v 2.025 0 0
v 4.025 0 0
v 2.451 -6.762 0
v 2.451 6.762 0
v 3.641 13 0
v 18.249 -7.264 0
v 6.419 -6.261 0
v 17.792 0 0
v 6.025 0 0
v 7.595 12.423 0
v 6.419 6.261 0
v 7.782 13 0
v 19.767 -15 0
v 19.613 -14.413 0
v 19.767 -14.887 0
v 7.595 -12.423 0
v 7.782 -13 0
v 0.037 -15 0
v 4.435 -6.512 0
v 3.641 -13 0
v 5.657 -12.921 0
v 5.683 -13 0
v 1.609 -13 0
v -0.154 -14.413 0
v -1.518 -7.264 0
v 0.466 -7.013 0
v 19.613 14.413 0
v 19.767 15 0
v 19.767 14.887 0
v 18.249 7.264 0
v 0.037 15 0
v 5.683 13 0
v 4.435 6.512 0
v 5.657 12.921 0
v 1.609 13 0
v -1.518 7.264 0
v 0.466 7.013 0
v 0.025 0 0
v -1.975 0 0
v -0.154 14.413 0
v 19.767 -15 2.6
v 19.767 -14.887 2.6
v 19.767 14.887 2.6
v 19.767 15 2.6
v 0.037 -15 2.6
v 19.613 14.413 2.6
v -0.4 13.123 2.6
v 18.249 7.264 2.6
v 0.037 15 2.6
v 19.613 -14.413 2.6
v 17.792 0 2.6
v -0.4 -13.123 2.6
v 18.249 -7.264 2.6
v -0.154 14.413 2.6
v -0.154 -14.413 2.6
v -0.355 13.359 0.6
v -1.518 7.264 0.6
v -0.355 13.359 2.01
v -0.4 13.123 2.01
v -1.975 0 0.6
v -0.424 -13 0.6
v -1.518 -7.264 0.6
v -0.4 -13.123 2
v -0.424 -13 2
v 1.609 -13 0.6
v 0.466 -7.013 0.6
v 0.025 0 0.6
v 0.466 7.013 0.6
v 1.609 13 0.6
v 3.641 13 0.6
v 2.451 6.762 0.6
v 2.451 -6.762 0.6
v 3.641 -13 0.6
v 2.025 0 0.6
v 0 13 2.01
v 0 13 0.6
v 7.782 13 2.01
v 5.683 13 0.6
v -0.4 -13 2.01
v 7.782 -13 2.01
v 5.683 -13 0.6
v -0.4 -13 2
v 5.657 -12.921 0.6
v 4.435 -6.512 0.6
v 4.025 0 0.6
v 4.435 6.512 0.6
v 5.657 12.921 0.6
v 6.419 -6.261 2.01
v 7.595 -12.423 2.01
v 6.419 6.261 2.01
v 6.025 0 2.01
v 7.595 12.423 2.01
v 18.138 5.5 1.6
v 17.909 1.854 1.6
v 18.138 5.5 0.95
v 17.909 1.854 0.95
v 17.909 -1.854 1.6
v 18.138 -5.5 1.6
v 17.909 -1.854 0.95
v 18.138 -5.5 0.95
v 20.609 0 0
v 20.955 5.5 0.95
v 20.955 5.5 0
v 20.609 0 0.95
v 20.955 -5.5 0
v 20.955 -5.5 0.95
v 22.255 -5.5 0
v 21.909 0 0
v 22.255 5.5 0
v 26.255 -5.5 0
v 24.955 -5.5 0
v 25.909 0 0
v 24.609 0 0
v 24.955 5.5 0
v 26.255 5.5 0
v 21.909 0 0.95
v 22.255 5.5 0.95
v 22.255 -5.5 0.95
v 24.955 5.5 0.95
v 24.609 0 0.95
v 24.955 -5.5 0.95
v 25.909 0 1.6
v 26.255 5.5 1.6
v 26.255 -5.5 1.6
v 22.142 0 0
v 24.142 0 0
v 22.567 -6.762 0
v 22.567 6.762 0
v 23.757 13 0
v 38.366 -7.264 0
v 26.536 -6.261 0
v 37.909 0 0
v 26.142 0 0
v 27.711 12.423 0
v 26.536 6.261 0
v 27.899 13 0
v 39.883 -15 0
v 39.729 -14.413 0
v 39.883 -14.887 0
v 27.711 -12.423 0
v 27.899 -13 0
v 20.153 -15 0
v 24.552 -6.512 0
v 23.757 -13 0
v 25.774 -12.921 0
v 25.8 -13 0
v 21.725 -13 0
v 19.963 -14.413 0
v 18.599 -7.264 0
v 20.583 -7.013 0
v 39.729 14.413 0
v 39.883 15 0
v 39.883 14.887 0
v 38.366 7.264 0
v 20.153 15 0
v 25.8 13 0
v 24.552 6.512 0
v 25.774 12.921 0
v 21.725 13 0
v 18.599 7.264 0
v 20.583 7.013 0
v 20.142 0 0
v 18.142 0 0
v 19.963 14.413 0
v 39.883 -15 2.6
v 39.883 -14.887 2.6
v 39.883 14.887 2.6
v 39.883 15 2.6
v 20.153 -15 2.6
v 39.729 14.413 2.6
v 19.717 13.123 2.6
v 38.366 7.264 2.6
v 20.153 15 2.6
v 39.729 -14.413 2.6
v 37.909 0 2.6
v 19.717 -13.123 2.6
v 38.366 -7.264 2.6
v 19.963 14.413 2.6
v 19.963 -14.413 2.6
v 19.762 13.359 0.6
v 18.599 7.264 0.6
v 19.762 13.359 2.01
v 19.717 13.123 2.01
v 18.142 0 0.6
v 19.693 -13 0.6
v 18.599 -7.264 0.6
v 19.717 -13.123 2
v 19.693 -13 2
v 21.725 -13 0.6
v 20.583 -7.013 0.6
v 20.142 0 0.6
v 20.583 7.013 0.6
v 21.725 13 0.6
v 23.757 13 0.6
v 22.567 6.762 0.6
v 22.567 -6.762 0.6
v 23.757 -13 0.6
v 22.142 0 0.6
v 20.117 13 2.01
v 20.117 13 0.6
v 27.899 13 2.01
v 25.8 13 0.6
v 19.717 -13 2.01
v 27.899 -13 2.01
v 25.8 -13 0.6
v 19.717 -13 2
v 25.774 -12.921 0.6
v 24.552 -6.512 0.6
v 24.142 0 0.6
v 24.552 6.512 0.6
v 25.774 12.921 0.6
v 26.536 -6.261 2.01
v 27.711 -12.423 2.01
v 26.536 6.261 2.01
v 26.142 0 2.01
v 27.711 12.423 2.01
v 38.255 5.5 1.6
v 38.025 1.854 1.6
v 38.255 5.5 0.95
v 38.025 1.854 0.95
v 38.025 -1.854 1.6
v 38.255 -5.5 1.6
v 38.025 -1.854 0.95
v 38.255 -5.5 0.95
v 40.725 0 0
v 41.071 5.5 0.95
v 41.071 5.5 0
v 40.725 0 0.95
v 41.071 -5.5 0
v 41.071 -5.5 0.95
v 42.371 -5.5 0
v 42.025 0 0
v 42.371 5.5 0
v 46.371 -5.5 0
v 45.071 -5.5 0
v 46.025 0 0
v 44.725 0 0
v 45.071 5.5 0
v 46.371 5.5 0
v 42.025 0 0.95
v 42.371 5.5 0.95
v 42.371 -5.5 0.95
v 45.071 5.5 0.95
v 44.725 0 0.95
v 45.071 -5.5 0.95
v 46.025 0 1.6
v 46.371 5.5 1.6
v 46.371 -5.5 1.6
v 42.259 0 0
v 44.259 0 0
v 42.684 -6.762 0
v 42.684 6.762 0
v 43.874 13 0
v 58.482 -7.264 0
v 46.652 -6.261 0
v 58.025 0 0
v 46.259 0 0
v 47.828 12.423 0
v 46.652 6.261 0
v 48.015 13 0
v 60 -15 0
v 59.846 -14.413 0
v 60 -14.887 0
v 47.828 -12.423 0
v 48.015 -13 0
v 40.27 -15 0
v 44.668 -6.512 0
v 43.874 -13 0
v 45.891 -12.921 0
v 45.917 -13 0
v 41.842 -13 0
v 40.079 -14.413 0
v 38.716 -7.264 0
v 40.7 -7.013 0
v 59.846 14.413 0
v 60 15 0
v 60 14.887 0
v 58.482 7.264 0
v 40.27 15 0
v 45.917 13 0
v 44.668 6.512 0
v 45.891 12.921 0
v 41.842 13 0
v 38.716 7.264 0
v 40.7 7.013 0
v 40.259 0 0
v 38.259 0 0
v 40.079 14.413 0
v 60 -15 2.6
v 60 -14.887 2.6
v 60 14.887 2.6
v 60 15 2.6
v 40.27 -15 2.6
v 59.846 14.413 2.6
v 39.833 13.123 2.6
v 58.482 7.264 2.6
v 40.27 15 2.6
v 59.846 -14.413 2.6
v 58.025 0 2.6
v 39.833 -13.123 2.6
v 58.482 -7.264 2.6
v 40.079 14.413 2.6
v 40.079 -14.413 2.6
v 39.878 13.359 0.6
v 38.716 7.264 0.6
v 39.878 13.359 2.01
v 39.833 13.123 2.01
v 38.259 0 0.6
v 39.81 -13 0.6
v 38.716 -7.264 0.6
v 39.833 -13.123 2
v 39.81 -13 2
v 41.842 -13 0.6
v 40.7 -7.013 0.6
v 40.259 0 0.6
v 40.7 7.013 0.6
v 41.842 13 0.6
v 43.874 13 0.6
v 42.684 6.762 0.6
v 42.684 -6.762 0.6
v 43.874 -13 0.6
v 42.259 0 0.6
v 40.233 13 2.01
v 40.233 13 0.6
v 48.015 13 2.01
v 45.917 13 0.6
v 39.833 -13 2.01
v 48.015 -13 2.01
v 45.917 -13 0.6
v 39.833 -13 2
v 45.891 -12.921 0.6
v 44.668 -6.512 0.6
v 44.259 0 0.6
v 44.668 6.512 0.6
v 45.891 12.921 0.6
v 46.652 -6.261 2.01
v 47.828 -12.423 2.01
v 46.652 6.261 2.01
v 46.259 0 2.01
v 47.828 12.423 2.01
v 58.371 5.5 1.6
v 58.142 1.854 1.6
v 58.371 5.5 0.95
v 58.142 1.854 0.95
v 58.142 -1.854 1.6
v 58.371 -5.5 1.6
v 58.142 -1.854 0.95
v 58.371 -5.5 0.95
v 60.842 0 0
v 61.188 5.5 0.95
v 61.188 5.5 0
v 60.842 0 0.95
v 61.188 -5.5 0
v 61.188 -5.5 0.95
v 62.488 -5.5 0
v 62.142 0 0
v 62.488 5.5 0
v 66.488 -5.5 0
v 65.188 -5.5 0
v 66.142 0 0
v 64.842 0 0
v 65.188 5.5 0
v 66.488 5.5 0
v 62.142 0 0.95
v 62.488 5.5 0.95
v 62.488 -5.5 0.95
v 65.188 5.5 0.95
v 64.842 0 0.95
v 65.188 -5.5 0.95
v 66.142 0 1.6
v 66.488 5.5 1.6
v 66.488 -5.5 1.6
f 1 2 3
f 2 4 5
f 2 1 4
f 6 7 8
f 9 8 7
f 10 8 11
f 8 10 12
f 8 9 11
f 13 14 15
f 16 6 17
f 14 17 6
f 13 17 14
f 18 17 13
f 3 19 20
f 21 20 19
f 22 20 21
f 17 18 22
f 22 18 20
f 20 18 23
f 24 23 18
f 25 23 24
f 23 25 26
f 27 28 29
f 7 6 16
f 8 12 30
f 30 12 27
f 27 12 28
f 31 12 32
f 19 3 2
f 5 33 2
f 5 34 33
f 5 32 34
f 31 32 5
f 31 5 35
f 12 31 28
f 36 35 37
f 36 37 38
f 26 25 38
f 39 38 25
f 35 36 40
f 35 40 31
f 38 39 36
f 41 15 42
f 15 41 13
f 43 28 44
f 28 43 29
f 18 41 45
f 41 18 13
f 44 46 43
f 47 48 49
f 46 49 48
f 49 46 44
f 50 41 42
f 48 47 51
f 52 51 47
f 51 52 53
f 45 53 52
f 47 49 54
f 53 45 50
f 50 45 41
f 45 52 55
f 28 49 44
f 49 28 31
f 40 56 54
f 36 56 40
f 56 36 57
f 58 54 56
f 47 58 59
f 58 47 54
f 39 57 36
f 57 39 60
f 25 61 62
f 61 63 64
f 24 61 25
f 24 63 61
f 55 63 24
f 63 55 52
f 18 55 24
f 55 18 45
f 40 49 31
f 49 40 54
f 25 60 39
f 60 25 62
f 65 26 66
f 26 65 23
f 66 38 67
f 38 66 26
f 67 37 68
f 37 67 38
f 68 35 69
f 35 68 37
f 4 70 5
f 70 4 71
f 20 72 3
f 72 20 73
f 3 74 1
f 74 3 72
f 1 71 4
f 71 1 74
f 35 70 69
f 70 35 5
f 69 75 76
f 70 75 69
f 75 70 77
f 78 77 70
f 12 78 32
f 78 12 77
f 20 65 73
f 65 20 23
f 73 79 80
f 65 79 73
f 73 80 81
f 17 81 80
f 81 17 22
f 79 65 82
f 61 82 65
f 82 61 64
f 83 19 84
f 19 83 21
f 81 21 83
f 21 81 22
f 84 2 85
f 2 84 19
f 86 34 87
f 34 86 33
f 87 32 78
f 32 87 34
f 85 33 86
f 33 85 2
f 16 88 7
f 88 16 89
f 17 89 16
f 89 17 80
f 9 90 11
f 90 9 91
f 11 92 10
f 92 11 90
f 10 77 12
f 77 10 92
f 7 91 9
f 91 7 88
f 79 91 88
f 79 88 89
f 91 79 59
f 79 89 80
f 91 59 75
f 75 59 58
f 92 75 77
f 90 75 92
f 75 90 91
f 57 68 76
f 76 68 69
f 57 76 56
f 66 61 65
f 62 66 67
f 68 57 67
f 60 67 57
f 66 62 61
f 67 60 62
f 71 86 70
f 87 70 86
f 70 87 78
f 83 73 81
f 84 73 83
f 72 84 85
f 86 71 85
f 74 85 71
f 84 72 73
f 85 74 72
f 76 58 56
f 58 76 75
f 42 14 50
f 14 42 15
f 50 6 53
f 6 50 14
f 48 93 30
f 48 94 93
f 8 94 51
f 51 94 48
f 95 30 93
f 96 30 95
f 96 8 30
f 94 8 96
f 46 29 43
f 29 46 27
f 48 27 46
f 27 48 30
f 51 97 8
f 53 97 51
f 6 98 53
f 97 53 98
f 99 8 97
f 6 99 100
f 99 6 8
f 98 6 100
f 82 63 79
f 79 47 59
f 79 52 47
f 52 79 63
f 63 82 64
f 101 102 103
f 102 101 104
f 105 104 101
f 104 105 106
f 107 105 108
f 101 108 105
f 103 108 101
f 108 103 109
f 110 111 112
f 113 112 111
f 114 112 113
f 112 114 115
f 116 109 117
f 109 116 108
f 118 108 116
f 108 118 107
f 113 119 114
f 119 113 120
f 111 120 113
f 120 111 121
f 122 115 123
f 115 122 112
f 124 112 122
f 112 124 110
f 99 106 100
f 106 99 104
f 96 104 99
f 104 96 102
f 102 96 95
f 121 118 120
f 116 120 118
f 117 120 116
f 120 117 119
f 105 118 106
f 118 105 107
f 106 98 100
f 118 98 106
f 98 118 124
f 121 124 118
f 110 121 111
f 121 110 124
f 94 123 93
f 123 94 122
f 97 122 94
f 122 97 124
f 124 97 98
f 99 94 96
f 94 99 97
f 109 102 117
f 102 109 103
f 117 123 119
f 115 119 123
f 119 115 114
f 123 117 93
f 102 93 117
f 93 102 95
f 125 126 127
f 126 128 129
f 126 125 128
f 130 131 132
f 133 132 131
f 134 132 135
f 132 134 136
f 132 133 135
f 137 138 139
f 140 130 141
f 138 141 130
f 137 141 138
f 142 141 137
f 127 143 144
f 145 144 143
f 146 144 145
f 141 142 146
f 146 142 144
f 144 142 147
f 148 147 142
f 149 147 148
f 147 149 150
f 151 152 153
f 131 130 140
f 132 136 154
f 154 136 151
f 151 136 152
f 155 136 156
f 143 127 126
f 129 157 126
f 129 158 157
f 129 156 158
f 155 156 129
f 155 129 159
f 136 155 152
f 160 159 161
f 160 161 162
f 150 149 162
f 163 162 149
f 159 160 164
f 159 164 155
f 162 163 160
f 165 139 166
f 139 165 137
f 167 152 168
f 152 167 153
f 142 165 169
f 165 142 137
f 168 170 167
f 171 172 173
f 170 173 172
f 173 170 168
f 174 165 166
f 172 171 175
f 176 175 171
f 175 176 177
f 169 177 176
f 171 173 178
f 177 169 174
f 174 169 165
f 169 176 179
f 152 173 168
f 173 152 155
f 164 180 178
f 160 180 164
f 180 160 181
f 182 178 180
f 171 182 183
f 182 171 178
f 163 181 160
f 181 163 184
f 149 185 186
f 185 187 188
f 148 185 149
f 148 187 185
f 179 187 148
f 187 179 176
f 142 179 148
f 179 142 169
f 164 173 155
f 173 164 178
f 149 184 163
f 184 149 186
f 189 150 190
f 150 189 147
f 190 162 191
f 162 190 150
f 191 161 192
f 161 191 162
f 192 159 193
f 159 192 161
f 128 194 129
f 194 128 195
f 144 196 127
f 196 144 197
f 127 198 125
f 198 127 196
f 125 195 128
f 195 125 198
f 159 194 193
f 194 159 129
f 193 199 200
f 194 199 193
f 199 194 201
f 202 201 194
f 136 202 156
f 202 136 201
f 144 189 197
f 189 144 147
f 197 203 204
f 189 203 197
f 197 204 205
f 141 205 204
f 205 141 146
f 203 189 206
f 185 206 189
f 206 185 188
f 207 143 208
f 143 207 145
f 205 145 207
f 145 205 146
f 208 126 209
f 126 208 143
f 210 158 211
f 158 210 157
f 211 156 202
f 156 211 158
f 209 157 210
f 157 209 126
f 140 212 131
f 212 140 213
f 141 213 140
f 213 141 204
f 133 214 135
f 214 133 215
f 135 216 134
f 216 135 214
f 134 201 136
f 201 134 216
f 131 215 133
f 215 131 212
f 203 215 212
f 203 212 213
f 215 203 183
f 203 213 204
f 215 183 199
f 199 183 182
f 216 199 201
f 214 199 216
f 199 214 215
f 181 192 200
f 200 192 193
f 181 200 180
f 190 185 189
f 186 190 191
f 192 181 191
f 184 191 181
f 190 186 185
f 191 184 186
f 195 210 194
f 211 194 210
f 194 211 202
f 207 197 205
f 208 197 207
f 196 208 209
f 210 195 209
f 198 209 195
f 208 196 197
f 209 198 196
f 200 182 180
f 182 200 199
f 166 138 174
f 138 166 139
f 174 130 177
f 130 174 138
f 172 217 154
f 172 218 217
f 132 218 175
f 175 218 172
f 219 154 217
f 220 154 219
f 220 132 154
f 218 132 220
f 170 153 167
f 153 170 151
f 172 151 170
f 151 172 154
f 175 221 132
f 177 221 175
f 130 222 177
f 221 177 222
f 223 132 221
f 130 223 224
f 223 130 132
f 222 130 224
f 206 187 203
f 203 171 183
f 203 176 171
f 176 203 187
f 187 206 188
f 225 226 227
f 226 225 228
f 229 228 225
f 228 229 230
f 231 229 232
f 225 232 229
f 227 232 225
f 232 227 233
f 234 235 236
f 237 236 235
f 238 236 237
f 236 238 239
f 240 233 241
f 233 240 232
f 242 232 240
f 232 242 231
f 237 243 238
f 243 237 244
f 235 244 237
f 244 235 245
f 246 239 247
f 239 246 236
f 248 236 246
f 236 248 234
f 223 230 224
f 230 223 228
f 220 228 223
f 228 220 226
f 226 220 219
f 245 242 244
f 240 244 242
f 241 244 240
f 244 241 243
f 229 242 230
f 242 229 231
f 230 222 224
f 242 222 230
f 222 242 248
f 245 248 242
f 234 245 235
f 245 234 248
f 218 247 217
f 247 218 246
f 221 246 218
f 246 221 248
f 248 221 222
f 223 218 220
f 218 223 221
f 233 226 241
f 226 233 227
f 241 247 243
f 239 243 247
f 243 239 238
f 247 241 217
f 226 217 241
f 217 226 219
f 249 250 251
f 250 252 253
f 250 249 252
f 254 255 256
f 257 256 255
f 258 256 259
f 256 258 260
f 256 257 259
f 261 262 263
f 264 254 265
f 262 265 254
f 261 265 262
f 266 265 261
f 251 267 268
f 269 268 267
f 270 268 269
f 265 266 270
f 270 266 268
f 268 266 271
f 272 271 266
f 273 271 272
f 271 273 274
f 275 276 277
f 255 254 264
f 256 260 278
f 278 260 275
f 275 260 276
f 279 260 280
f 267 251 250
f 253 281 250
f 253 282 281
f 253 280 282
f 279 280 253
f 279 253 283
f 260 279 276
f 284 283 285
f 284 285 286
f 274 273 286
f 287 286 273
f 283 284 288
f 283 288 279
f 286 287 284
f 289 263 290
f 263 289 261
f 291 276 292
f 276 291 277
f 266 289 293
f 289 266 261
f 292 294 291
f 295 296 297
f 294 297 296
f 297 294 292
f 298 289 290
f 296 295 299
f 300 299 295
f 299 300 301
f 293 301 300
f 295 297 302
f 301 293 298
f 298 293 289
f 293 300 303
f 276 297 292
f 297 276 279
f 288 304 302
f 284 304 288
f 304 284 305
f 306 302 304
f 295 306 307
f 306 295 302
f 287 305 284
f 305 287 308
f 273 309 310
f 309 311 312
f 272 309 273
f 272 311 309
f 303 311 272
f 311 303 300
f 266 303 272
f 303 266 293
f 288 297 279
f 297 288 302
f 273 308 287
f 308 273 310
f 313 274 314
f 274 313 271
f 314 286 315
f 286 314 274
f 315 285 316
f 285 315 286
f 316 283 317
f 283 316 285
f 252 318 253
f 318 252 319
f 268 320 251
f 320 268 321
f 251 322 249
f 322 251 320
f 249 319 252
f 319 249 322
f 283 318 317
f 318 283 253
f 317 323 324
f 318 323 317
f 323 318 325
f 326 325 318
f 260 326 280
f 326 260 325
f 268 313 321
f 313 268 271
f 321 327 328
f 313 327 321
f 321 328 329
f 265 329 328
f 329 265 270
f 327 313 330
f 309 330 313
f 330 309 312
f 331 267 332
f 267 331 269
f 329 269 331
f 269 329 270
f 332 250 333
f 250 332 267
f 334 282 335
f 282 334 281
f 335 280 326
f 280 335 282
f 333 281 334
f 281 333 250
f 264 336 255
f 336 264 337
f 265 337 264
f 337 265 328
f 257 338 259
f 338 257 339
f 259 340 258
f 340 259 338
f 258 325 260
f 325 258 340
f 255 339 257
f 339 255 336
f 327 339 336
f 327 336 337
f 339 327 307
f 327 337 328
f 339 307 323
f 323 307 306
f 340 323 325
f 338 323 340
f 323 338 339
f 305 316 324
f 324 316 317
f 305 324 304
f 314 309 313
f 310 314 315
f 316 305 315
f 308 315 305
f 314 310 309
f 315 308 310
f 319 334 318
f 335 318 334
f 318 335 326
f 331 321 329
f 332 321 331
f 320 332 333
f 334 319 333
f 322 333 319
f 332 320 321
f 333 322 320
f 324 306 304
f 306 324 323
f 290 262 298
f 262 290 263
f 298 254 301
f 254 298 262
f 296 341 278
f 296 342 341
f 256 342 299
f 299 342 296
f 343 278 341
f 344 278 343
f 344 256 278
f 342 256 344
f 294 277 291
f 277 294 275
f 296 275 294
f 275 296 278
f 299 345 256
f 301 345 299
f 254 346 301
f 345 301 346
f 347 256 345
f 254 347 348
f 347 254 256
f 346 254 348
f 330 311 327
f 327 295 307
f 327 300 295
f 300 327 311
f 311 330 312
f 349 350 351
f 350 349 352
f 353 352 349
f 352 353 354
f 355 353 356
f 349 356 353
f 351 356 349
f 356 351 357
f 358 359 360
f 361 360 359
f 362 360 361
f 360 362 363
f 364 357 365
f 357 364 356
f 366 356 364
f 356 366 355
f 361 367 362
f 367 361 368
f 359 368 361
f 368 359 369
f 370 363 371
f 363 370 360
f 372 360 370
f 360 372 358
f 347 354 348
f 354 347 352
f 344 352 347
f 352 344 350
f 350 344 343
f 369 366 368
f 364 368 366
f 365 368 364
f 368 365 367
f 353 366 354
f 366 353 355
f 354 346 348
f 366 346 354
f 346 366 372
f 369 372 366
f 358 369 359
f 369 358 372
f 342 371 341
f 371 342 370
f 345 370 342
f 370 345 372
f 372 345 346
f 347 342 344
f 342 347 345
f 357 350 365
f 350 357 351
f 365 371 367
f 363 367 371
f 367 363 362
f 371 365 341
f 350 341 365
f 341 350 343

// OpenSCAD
// Create an articulated print-in-place spine, with connections allowing rotational movement.


/* [Dimensions] */
// Length of chain.
Length = 60;
// Segment resolution.
Segments = 3;
// Width at start of chain.
WidthStart = 30;
// Width at end of chain.
WidthEnd = 30;
// Interpolation method.
Interpolation = "Linear"; // [ "Linear", "Quadratic", "Concave", "Convex" ]
// Influence the strength and shape of interpolation.
InterpolationStrength = 1.0; // [-1.00 : 0.00 : 1.00]


// Depth override, leave at 0 to control by layering for low-profile (flat) design.
UserDepth = 0;
// Extra depth above the mechanical structure
ExtraDepth = 0.4;
// Design layer height (n * LayerHeight).
LayersPerLevel = 3; // [1 : 1 : 10] 
// Segment length extension. Distance between terminals.
Extension = 5; 


/* [Mechanism] */ 
// Angle encompassed within given width, determine rotation in either dimension.
Angle = 15;
// Ratio of radius to cut window for connection, enlarges/restricts range of motion.
Window = 1.3; // [0.51 : 0.01 : 2.00]
// Ratio of radius for bridge thickness, trading strength for extra sweeping through window.
Connection = 0.6; // [0.2 : 0.01 : 0.5]
// Thickness of each band/arc within sliding mechanism. 
Band = 2;


/* [Print] */ 
// Slicer layer height, for calculating depths.
LayerHeight = 0.2; // [0.01 : 0.05 : 0.6]
// Standard clearance for print-in-place gaps.
Clearance = 0.2; 
// Clearance for bridging, greater to avoid sag fusing.
ClearanceBridge = 0.4;
// Clearance related to the bed, which can be trickier. Adjust as you would for elephant foot compensation.
ClearanceBed = 0.35;


/* [Hidden] */
$fs = 1;
$fn = 50;
Overlap = 0.01;

    
// Computed 
Level = UserDepth != 0 ? (UserDepth - 2*ClearanceBridge)/3 : LayerHeight * LayersPerLevel;
Depth = UserDepth != 0 ? UserDepth : 3 * Level + 2 * ClearanceBridge;

// Segments of chain have a start and end width, following input values for whole chain through function.

Widths = interpolate(WidthStart, WidthEnd, Segments);

// incorporate the distance between (bedclearance)?
function interpolate(startWidth, endWidth, Segments) = [for (i = [0 : Segments+1]) startWidth + (endWidth - startWidth) * widthShaping(i / (Segments))];
function widthShaping(c) = Interpolation == "Linear" ? c : 3*pow(c, 2) - 2*pow(c, 3);

module Guide() {
    for(i = [0 : 1 : Segments-1]) {
        Length = Length/Segments - ClearanceBed + ClearanceBed/Segments;
        translate([i*(Length + ClearanceBed), 0, Depth + 1])
        linear_extrude(Depth)
        polygon(points = [[0, Widths[i]/2], [Length, Widths[i+1]/2], [Length, -Widths[i+1]/2], [0, -Widths[i]/2]]);
    }
       
    translate([0, -WidthStart/2, Depth*2 + 2])
    #cube([Length, WidthStart, Depth]);        
}
//Guide();

module Connector() {
    union() {
        intersection() {
            translate([0,0,-Overlap/2])
            linear_extrude(Depth+Overlap)
            polygon(points = [[-R1+R1PosX, startWidth/2] , [0, startWidth/2 - Band], [Length, endWidth/2 - Band], [Length, -endWidth/2 + Band], [0, -startWidth/2 + Band], [-R1 + R1PosX, -startWidth/2 + Band]]);
        
            translate([R1PosX, 0, -Overlap/2])
            difference() {
                cylinder(Level + Overlap, R1-Band, R1-Band);
                translate([0,0,-Overlap])
                cylinder(Level + Overlap*2, R1-2*Band, R1-2*Band);
            }           
        }
        
        intersection() {
            translate([0,0,-Overlap/2])
            linear_extrude(Depth+Overlap)
            polygon(points = [[-R1+R1PosX, startWidth/2] , [0, startWidth/2 - Band], [Length, endWidth/2 - Band], [Length, -endWidth/2 + Band], [0, -startWidth/2 + Band], [-R1 + R1PosX, -startWidth/2 + Band]]);
        
            translate([R1PosX, 0, -Overlap/2])
            difference() {
                cylinder(Level + Overlap, R1-3*Band, R1-3*Band);
                translate([0,0,-Overlap])
                cylinder(Level + Overlap*2, R1-4*Band, R1-4*Band);
            }         
        }
        
        intersection() {
            translate([0,0,-Overlap/2])
            linear_extrude(Depth+Overlap)
            polygon(points = [[-R1+R1PosX, startWidth/2] , [0, startWidth/2 - Band], [Length, endWidth/2 - Band], [Length, -endWidth/2 + Band], [0, -startWidth/2 + Band], [-R1 + R1PosX, -startWidth/2 + Band]]);
        
            translate([R1PosX, 0, Level])
            difference() {
                cylinder(Level + 2*ClearanceBed + Overlap, R1+Overlap, R1+Overlap);
                translate([0,0,-Overlap])
                cylinder(Level + 2*ClearanceBed + Overlap*2, R1-4*Band, R1-4*Band);
            }         
        }
    }
}

module Segment(startWidth = 15 , endWidth = 12, Length = 10) {
    R1 = (startWidth/2) / sin(Angle);
    R1PosX = (startWidth/2) / tan(Angle);
    
    R2 = (endWidth/2) / sin(Angle);
    R2PosX = (endWidth/2) / tan(Angle); // R1PosX - Length;

    union() {
        difference() {
            intersection() {
                linear_extrude(Depth)
                polygon(points = [[-R1+R1PosX, startWidth/2], [0, startWidth/2], [Length, endWidth/2], [Length, -endWidth/2], [0, -startWidth/2], [-R1 + R1PosX, -startWidth/2]]);
            
                translate([R1PosX, 0,0])
                cylinder(Depth, R1, R1);
            }
            
            translate([R2PosX+Length, 0, -Overlap/2])
            cylinder(Depth + Overlap, R2, R2);
            
            intersection() {
                translate([0,0,-Overlap/2])
                linear_extrude(Depth+Overlap)
                polygon(points = [[-R1+R1PosX, startWidth/2] , [0, startWidth/2 - Band], [Length, endWidth/2 - Band], [Length, -endWidth/2 + Band], [0, -startWidth/2 + Band], [-R1 + R1PosX, -startWidth/2 + Band]]);
            
                translate([R1PosX, 0, -Overlap/2])
                difference() {
                    cylinder(Level + Overlap, R1-Band, R1-Band);
                    translate([0,0,-Overlap])
                    cylinder(Level + Overlap*2, R1-2*Band, R1-2*Band);
                }           
            }
            
            intersection() {
                translate([0,0,-Overlap/2])
                linear_extrude(Depth+Overlap)
                polygon(points = [[-R1+R1PosX, startWidth/2] , [0, startWidth/2 - Band], [Length, endWidth/2 - Band], [Length, -endWidth/2 + Band], [0, -startWidth/2 + Band], [-R1 + R1PosX, -startWidth/2 + Band]]);
            
                translate([R1PosX, 0, -Overlap/2])
                difference() {
                    cylinder(Level + Overlap, R1-3*Band, R1-3*Band);
                    translate([0,0,-Overlap])
                    cylinder(Level + Overlap*2, R1-4*Band, R1-4*Band);
                }         
            }
            
            intersection() {
                translate([0,0,-Overlap/2])
                linear_extrude(Depth+Overlap)
                polygon(points = [[-R1+R1PosX, startWidth/2] , [0, startWidth/2 - Band], [Length, endWidth/2 - Band], [Length, -endWidth/2 + Band], [0, -startWidth/2 + Band], [-R1 + R1PosX, -startWidth/2 + Band]]);
            
                translate([R1PosX, 0, Level])
                difference() {
                    cylinder(Level + 2*ClearanceBridge + Overlap, R1+Overlap, R1+Overlap);
                    translate([0,0,-Overlap])
                    cylinder(Level + 2*ClearanceBridge + Overlap*2, R1-4*Band, R1-4*Band);
                }         
            }
            
            translate([-2.4, -startWidth/2, Level*2 + ClearanceBridge*2])
            cube([2, startWidth, Level + Overlap]);
        }

        translate([Length + ClearanceBed + ClearanceBed/Segments,0,0])
        intersection() {
            linear_extrude(Level*2 + ClearanceBridge)
            polygon(points = [[-R1+R1PosX-ClearanceBed, startWidth/4 - Band] , [0, startWidth/4 - Band], [Length, endWidth/4 - Band], [Length, -endWidth/4 + Band], [0, -startWidth/4 + Band], [-R1 + R1PosX - ClearanceBed, -startWidth/4 + Band]]);

            union() {
                translate([R1PosX, 0, 0])
                difference() {
                    cylinder(Level*2 + ClearanceBridge, R1-Band-ClearanceBed, R1-Band-ClearanceBed);
                    translate([0,0,-Overlap/2])
                    cylinder(Level*2 + ClearanceBridge + Overlap, R1-2*Band + ClearanceBed, R1-2*Band + ClearanceBed);
                }           
            
                translate([R1PosX, 0, -Overlap/2])
                difference() {
                    cylinder(Level*2 + ClearanceBridge, R1-3*Band - ClearanceBed, R1-3*Band - ClearanceBed);
                    translate([0,0,-Overlap/2])
                    cylinder(Level*2 + ClearanceBridge + Overlap, R1-4*Band + ClearanceBed, R1-4*Band + ClearanceBed);
                }         
   
                translate([R1PosX, 0, Level+ClearanceBed])
                difference() {
                    translate([-ClearanceBed,0,0])
                    cylinder(Level + 2*ClearanceBridge, R1+ClearanceBed, R1+ClearanceBed);
                    translate([0,0,-Overlap/2])
                    cylinder(Level + 2*ClearanceBridge + Overlap, R1-4*Band + ClearanceBed, R1-4*Band + ClearanceBed);
                }         
            }
        }
    }
}

module Spine() {
    for(i = [0 : 1 : Segments-1]) {
        
        WidthStartSeg = Widths[i];
        WidthEndSeg = Widths[i+1];
        Length = Length/Segments - ClearanceBed + ClearanceBed/Segments;
        
        translate([i*Length + i*ClearanceBed, 0, 0])
        //translate([(i == 0 ? 0 : ClearanceBed/2), -Widths[i]/2, 0])
        Segment(WidthStartSeg, WidthEndSeg, Length);
        
    }
}

Spine();



/* check radius/width and length etc.

module Arc(
    Width = 10,
    Angle = 15,
    Length = 10,
    Depth = 3
) {
    
    Radius = (Width/2) / sin(Angle);
    R1PosX = (Width/2) / tan(Angle);
    
    intersection() {
        translate([R1PosX, 0, 0])
        cylinder(Depth, Radius, Radius);
        
        difference() {
            
            translate([-Radius+R1PosX, -Width/2 ,0 ])
            cube([2*(Radius-R1PosX) + Length, Width, Depth*2]);
            
            translate([-R1PosX + Radius + R1PosX + Length, 0, -Overlap])
            cylinder(Depth + Overlap*2, Radius, Radius);
        }
    }
}

module Segment(
    r1 = 10,
    r2 = 8,  
    start = false,
    end = false,
    guide = false
){
    

    difference() {
        Arc(15, 15, MechanismSpace + Extension, Depth + ExtraDepth);
        
        intersection() {
            translate([MechanismSpace/4, 0 , -Overlap])
            Arc(Width, Angle, MechanismSpace/2, Level*2+ClearanceBridge*2+Overlap);
            
            cube([Width*10, Width*0.9, Depth*2], center=true);
        }
        
        translate([-Width/3,-Width*0.45,Level])
        cube([Width/2, Width*0.9, Level+2*ClearanceBridge]);
        
        translate([-10,-Width*0.45,2*Level+ClearanceBridge*2 - Overlap])
        cube([10,Width*0.9,Level+ExtraDepth + 2*Overlap]);
    }
    
    union() {
        intersection() {
            
            translate([MechanismSpace/4 + Clearance,0,0])
            Arc(15,15,MechanismSpace/2 - 2*Clearance, Level*2 + ClearanceBridge);
            
            translate([-Width/8,-Width*0.25,0])
            cube([Width/2, Width*0.5, Level*2+ClearanceBridge]);
        }
        
        translate([-1.8,-Width/4,Level+ClearanceBridge])
        cube([2.5,Width/2,Level]);
    }

}

module Spine (
    n = 3, 
    R1 = 10, 
    R2 = 0) {
    // Form spine of segments, checking radius differentials etc and creating endcaps.

    for(i = [0 : 1 : n-1]) {
        translate([i * (MechanismSpace + Extension + 1 + Clearance)  ,0,0])
        Segment(
            r1 = R1, 
            r2 = R2 == 0 ? R1 : R2, 
            start = (i == 0),
            end = (i == n-1)
        );
    }
}

//Segment();
Spine();

//Spine(n = 3, R1 = Radius);

*/
